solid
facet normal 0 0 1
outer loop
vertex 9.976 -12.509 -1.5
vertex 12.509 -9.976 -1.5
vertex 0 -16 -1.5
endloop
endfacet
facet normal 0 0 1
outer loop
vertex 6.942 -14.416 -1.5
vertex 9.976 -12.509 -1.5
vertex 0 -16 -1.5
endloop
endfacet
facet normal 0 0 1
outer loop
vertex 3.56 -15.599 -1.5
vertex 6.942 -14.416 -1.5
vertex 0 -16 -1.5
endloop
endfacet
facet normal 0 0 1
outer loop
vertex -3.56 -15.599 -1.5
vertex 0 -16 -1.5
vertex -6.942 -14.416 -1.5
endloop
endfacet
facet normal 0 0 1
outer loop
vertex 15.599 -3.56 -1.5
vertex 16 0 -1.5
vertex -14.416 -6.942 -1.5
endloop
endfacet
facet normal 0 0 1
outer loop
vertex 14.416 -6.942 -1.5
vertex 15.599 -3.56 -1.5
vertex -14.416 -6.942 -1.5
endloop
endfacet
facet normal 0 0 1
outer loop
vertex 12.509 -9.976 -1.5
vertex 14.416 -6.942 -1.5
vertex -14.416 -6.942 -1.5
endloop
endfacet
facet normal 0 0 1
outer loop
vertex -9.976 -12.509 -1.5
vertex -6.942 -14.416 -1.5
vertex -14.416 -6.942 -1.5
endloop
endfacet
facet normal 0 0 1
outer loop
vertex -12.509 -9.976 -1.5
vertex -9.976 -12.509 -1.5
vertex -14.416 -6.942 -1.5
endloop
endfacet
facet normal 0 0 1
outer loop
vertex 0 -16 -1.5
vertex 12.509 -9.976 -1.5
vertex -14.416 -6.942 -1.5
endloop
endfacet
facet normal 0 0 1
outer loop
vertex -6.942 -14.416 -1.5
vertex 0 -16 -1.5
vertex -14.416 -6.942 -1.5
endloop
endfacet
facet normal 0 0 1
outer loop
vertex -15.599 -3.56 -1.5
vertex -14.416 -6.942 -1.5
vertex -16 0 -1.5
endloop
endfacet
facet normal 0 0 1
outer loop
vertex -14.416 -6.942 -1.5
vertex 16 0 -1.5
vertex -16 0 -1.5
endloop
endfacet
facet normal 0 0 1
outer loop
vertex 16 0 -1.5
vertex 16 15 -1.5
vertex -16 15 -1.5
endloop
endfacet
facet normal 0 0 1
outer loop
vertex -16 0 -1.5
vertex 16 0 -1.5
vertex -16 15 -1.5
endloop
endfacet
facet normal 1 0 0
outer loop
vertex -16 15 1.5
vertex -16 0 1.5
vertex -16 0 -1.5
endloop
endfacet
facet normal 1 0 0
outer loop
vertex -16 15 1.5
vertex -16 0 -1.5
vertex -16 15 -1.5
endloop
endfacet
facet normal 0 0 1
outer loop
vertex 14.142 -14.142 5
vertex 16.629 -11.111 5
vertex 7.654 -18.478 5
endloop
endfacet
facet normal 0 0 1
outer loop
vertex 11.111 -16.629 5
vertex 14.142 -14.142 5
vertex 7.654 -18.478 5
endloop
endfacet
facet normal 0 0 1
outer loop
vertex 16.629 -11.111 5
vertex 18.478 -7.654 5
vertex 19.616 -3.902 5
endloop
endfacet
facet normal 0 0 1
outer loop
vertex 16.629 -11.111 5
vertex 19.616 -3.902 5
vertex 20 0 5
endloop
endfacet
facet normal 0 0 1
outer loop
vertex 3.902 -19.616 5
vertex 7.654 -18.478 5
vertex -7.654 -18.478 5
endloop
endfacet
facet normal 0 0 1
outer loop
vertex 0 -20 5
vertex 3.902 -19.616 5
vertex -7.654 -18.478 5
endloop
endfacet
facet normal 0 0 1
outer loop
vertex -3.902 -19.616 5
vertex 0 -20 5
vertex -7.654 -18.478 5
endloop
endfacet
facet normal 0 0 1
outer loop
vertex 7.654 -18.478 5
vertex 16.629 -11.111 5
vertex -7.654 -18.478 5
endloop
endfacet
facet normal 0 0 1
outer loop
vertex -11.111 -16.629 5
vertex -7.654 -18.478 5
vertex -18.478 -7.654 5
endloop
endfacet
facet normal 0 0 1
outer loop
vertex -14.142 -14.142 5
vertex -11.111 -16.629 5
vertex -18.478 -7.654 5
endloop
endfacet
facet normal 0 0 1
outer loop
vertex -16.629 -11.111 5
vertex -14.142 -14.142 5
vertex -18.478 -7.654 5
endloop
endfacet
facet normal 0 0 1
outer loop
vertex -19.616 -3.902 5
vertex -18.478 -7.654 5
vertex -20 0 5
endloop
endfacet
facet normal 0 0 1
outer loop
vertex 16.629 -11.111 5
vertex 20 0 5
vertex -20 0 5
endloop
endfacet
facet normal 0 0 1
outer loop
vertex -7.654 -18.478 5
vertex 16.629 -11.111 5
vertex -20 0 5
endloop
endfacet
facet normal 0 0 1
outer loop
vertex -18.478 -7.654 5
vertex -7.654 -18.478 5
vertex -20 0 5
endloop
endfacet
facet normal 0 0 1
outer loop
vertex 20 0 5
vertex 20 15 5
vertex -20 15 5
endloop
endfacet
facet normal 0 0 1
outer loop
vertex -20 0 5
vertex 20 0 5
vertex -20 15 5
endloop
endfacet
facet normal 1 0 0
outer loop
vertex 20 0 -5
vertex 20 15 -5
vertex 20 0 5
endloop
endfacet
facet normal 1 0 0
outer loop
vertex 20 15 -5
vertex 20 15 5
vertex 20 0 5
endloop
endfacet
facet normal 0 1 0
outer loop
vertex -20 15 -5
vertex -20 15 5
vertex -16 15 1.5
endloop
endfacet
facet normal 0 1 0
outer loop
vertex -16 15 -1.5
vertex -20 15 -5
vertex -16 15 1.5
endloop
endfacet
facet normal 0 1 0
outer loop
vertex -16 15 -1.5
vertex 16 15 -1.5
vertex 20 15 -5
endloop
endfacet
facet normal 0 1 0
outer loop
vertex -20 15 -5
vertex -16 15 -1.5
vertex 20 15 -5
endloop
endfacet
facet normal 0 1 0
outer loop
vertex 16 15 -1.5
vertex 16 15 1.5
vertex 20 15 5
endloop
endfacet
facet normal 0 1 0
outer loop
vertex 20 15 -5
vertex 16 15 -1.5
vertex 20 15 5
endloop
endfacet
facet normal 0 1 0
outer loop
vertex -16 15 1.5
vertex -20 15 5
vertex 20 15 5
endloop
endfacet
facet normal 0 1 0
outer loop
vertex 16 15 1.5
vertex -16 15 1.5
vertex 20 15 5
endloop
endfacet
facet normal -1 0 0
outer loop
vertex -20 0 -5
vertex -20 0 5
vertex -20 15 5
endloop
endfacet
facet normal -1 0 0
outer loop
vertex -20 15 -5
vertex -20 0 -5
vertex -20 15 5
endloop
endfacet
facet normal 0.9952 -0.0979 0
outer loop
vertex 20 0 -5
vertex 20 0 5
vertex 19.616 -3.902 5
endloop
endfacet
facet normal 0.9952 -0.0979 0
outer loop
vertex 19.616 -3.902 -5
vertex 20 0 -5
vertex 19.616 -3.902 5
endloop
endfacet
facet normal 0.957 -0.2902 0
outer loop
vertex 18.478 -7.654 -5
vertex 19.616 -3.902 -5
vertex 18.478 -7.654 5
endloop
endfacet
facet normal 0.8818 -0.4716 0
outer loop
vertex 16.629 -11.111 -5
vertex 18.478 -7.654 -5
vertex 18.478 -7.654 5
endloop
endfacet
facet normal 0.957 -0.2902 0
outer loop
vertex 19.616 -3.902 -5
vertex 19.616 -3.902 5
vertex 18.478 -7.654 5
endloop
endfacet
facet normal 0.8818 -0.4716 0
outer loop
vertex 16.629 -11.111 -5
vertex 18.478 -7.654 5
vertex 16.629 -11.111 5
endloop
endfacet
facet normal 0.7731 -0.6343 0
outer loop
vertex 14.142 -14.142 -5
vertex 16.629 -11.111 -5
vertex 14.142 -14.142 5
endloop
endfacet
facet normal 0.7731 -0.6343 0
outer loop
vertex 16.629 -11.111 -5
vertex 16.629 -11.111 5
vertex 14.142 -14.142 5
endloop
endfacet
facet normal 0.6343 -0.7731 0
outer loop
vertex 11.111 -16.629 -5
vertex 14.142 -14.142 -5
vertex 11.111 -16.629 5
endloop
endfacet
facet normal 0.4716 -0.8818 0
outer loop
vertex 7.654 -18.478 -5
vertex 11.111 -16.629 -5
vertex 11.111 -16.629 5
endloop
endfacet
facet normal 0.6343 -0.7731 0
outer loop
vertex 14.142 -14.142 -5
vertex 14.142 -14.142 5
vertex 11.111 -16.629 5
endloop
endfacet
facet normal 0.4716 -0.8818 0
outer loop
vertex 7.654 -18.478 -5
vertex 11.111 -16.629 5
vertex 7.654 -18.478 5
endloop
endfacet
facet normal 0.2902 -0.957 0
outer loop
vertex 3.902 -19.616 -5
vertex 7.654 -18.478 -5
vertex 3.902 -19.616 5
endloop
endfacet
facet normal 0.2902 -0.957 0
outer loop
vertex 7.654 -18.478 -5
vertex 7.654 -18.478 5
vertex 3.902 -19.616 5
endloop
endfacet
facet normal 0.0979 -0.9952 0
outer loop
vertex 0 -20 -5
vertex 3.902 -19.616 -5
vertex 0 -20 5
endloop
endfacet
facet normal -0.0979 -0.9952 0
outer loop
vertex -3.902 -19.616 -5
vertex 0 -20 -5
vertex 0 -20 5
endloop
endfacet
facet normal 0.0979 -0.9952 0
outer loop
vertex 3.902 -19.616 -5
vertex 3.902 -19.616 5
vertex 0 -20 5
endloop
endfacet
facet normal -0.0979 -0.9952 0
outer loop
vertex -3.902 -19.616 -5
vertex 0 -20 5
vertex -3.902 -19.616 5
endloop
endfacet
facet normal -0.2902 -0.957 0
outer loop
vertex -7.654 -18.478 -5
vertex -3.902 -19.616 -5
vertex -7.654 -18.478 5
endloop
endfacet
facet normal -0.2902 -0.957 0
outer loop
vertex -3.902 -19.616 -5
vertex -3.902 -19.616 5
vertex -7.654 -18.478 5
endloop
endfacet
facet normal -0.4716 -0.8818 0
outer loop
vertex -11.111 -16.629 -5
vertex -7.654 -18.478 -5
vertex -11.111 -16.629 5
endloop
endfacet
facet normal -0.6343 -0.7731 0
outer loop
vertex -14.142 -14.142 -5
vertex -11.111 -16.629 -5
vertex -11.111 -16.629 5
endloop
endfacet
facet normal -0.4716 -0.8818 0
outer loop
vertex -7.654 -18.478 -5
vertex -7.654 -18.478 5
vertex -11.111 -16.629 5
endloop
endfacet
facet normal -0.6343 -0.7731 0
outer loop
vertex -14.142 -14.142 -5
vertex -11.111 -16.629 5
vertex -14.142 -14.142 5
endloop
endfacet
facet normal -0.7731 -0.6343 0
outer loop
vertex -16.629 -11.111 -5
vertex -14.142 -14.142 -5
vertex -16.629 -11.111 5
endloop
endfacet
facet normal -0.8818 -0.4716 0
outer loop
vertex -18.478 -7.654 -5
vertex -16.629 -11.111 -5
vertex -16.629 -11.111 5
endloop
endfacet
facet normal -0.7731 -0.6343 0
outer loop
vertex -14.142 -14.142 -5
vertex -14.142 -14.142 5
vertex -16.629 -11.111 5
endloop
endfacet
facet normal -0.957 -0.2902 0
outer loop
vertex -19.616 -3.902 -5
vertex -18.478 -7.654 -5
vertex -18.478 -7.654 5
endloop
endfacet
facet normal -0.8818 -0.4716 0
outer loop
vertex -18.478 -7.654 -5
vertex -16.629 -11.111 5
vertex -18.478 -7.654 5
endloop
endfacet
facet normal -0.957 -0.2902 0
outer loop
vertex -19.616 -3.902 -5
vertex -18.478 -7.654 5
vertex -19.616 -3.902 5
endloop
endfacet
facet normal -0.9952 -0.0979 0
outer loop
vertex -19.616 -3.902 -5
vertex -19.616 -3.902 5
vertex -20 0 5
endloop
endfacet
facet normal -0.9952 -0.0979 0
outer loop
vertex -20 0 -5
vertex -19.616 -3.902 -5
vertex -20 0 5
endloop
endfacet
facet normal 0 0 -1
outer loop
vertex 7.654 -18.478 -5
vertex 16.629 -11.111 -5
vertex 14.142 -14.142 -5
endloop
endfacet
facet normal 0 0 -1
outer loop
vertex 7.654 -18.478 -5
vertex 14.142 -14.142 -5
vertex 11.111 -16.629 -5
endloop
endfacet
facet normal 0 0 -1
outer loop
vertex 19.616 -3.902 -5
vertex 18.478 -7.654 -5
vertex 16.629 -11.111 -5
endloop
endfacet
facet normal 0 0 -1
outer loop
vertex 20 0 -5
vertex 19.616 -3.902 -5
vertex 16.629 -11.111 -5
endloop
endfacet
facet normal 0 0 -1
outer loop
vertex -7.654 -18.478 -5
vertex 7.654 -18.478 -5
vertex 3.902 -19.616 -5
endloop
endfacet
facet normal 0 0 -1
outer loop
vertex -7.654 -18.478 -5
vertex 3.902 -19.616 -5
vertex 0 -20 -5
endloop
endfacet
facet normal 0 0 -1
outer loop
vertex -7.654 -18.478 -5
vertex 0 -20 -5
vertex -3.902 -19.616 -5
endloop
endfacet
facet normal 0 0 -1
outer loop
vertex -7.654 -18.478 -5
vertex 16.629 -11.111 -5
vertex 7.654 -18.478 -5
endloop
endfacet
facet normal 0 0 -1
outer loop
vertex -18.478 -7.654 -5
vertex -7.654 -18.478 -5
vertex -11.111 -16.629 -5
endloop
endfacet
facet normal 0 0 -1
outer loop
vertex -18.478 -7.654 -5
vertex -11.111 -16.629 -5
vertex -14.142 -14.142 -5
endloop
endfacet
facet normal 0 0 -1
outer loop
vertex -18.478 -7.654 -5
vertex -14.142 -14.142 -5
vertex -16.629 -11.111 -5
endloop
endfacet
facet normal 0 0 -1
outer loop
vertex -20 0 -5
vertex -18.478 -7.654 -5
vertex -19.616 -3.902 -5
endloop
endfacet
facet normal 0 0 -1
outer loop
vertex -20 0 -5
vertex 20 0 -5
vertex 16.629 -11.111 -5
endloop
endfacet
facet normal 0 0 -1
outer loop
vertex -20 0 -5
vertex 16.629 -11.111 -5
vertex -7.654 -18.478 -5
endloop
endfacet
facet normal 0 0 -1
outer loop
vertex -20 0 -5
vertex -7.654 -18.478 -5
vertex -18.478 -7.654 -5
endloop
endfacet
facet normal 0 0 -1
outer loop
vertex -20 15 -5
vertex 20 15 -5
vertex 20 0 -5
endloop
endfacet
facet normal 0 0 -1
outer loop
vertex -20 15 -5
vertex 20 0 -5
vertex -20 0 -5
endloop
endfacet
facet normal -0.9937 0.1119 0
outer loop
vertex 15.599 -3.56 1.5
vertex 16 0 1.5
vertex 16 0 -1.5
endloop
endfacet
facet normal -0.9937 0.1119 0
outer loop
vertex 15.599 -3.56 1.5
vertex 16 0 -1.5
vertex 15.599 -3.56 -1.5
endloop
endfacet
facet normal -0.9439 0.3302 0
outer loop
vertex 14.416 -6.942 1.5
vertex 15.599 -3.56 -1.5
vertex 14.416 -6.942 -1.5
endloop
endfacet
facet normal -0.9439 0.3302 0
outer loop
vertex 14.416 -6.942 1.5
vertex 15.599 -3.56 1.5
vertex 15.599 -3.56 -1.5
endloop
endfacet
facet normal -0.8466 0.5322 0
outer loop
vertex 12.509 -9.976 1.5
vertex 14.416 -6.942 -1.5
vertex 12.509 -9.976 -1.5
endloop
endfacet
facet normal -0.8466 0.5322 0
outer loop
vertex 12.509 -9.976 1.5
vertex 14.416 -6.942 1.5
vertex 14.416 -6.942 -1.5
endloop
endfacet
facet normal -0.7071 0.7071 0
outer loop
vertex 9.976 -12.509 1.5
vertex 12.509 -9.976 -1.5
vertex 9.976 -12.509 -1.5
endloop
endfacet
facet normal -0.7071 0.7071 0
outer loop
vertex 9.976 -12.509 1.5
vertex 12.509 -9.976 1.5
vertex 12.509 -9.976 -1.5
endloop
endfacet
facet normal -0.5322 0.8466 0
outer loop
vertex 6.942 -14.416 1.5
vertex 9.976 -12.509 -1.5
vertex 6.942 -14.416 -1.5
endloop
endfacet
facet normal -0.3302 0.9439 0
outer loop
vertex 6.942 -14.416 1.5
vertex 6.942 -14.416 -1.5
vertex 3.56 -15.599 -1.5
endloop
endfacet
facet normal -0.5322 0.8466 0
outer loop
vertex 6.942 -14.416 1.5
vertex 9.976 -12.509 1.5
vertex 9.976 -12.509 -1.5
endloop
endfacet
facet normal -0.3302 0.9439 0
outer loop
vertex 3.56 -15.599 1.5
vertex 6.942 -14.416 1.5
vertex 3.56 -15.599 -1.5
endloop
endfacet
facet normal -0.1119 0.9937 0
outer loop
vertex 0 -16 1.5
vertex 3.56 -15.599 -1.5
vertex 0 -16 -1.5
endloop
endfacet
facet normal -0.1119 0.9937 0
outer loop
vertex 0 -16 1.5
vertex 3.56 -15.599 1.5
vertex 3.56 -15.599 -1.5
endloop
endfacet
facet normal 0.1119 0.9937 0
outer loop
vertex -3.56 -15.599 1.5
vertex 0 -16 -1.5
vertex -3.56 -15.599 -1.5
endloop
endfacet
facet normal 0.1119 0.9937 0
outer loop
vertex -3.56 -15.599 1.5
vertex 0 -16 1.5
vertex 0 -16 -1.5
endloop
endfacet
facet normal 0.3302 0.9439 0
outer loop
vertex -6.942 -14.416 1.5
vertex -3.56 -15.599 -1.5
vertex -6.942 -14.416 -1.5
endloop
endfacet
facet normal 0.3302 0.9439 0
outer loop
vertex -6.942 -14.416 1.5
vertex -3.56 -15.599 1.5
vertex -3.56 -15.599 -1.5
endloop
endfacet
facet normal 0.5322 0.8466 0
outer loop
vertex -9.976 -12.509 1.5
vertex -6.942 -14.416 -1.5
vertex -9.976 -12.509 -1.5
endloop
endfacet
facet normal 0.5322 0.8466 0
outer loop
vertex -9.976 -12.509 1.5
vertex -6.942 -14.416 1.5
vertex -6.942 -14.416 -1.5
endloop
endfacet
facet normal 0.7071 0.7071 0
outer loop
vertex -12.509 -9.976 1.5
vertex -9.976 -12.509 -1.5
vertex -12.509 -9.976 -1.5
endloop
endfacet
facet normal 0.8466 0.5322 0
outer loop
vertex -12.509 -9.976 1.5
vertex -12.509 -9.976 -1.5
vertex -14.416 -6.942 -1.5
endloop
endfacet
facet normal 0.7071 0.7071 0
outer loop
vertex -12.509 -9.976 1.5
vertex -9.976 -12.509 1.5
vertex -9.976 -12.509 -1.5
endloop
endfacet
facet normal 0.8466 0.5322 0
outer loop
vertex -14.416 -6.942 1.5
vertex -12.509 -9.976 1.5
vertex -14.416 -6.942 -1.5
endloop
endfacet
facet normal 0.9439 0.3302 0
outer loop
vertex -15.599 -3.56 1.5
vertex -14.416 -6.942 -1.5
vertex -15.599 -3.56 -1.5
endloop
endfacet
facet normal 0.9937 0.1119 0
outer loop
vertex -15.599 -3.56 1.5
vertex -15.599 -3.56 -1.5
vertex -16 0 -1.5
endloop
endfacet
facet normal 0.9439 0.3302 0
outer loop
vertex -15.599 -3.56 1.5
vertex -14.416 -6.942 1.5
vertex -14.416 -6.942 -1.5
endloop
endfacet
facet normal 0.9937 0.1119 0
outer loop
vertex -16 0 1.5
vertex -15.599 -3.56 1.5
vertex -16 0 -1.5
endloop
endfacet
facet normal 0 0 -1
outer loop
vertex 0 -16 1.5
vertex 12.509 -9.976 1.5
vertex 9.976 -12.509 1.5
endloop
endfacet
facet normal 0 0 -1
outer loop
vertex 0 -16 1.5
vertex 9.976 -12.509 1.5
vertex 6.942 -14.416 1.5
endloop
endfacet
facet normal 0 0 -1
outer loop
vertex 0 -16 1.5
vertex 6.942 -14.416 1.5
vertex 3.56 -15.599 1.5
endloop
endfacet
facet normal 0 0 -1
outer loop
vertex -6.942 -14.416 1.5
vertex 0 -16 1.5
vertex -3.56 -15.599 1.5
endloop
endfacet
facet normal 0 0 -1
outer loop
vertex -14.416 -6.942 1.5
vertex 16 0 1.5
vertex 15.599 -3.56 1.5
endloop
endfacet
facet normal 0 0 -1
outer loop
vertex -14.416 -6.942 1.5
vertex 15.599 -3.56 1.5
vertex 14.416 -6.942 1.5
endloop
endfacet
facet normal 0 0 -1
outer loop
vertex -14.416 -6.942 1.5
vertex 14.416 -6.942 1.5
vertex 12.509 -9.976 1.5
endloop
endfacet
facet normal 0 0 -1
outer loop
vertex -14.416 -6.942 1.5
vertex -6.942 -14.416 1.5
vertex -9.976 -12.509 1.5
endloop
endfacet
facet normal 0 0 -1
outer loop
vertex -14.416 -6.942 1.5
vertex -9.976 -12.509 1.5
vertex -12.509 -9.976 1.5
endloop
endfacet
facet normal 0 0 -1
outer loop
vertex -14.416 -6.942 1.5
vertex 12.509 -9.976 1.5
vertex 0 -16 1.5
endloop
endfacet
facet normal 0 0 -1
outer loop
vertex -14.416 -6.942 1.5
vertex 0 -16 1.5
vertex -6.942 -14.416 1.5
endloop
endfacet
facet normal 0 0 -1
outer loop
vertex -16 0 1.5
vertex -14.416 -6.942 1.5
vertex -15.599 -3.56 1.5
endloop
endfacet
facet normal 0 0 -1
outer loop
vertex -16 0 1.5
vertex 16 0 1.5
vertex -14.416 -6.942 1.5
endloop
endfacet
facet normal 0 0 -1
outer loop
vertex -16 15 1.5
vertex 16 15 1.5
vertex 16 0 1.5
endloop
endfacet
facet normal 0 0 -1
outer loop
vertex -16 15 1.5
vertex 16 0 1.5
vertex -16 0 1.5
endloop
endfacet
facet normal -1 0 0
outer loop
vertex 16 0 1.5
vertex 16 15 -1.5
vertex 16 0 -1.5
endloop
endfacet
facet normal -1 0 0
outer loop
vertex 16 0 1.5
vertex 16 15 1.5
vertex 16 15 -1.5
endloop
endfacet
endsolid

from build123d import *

# Parameters (mm, degrees)
EXTRUDE_1_DEPTH     = 5
CUT_EXTRUDE_2_DEPTH = 1.5


with BuildPart() as part:
    # 草图1 → 凸台-拉伸1 (new, symmetric)
    with BuildSketch(Plane.XY):
        with BuildLine():
            Line((-20, 0), (-20, 15))
            Line((-20, 15), (20, 15))
            Line((20, 15), (20, 0))
            ThreePointArc((20, 0), (0, -20), (-20, 0))
        make_face()
    extrude(amount=EXTRUDE_1_DEPTH, both=True)

    # 草图2 → 切除-拉伸2 (cut, symmetric)
    with BuildSketch(Plane.XY):
        with BuildLine():
            Line((-16, 0), (-16, 15))
            Line((-16, 15), (16, 15))
            Line((16, 15), (16, 0))
            ThreePointArc((16, 0), (0, -16), (-16, 0))
        make_face()
    extrude(amount=CUT_EXTRUDE_2_DEPTH, both=True, mode=Mode.SUBTRACT)


solid = part.part
